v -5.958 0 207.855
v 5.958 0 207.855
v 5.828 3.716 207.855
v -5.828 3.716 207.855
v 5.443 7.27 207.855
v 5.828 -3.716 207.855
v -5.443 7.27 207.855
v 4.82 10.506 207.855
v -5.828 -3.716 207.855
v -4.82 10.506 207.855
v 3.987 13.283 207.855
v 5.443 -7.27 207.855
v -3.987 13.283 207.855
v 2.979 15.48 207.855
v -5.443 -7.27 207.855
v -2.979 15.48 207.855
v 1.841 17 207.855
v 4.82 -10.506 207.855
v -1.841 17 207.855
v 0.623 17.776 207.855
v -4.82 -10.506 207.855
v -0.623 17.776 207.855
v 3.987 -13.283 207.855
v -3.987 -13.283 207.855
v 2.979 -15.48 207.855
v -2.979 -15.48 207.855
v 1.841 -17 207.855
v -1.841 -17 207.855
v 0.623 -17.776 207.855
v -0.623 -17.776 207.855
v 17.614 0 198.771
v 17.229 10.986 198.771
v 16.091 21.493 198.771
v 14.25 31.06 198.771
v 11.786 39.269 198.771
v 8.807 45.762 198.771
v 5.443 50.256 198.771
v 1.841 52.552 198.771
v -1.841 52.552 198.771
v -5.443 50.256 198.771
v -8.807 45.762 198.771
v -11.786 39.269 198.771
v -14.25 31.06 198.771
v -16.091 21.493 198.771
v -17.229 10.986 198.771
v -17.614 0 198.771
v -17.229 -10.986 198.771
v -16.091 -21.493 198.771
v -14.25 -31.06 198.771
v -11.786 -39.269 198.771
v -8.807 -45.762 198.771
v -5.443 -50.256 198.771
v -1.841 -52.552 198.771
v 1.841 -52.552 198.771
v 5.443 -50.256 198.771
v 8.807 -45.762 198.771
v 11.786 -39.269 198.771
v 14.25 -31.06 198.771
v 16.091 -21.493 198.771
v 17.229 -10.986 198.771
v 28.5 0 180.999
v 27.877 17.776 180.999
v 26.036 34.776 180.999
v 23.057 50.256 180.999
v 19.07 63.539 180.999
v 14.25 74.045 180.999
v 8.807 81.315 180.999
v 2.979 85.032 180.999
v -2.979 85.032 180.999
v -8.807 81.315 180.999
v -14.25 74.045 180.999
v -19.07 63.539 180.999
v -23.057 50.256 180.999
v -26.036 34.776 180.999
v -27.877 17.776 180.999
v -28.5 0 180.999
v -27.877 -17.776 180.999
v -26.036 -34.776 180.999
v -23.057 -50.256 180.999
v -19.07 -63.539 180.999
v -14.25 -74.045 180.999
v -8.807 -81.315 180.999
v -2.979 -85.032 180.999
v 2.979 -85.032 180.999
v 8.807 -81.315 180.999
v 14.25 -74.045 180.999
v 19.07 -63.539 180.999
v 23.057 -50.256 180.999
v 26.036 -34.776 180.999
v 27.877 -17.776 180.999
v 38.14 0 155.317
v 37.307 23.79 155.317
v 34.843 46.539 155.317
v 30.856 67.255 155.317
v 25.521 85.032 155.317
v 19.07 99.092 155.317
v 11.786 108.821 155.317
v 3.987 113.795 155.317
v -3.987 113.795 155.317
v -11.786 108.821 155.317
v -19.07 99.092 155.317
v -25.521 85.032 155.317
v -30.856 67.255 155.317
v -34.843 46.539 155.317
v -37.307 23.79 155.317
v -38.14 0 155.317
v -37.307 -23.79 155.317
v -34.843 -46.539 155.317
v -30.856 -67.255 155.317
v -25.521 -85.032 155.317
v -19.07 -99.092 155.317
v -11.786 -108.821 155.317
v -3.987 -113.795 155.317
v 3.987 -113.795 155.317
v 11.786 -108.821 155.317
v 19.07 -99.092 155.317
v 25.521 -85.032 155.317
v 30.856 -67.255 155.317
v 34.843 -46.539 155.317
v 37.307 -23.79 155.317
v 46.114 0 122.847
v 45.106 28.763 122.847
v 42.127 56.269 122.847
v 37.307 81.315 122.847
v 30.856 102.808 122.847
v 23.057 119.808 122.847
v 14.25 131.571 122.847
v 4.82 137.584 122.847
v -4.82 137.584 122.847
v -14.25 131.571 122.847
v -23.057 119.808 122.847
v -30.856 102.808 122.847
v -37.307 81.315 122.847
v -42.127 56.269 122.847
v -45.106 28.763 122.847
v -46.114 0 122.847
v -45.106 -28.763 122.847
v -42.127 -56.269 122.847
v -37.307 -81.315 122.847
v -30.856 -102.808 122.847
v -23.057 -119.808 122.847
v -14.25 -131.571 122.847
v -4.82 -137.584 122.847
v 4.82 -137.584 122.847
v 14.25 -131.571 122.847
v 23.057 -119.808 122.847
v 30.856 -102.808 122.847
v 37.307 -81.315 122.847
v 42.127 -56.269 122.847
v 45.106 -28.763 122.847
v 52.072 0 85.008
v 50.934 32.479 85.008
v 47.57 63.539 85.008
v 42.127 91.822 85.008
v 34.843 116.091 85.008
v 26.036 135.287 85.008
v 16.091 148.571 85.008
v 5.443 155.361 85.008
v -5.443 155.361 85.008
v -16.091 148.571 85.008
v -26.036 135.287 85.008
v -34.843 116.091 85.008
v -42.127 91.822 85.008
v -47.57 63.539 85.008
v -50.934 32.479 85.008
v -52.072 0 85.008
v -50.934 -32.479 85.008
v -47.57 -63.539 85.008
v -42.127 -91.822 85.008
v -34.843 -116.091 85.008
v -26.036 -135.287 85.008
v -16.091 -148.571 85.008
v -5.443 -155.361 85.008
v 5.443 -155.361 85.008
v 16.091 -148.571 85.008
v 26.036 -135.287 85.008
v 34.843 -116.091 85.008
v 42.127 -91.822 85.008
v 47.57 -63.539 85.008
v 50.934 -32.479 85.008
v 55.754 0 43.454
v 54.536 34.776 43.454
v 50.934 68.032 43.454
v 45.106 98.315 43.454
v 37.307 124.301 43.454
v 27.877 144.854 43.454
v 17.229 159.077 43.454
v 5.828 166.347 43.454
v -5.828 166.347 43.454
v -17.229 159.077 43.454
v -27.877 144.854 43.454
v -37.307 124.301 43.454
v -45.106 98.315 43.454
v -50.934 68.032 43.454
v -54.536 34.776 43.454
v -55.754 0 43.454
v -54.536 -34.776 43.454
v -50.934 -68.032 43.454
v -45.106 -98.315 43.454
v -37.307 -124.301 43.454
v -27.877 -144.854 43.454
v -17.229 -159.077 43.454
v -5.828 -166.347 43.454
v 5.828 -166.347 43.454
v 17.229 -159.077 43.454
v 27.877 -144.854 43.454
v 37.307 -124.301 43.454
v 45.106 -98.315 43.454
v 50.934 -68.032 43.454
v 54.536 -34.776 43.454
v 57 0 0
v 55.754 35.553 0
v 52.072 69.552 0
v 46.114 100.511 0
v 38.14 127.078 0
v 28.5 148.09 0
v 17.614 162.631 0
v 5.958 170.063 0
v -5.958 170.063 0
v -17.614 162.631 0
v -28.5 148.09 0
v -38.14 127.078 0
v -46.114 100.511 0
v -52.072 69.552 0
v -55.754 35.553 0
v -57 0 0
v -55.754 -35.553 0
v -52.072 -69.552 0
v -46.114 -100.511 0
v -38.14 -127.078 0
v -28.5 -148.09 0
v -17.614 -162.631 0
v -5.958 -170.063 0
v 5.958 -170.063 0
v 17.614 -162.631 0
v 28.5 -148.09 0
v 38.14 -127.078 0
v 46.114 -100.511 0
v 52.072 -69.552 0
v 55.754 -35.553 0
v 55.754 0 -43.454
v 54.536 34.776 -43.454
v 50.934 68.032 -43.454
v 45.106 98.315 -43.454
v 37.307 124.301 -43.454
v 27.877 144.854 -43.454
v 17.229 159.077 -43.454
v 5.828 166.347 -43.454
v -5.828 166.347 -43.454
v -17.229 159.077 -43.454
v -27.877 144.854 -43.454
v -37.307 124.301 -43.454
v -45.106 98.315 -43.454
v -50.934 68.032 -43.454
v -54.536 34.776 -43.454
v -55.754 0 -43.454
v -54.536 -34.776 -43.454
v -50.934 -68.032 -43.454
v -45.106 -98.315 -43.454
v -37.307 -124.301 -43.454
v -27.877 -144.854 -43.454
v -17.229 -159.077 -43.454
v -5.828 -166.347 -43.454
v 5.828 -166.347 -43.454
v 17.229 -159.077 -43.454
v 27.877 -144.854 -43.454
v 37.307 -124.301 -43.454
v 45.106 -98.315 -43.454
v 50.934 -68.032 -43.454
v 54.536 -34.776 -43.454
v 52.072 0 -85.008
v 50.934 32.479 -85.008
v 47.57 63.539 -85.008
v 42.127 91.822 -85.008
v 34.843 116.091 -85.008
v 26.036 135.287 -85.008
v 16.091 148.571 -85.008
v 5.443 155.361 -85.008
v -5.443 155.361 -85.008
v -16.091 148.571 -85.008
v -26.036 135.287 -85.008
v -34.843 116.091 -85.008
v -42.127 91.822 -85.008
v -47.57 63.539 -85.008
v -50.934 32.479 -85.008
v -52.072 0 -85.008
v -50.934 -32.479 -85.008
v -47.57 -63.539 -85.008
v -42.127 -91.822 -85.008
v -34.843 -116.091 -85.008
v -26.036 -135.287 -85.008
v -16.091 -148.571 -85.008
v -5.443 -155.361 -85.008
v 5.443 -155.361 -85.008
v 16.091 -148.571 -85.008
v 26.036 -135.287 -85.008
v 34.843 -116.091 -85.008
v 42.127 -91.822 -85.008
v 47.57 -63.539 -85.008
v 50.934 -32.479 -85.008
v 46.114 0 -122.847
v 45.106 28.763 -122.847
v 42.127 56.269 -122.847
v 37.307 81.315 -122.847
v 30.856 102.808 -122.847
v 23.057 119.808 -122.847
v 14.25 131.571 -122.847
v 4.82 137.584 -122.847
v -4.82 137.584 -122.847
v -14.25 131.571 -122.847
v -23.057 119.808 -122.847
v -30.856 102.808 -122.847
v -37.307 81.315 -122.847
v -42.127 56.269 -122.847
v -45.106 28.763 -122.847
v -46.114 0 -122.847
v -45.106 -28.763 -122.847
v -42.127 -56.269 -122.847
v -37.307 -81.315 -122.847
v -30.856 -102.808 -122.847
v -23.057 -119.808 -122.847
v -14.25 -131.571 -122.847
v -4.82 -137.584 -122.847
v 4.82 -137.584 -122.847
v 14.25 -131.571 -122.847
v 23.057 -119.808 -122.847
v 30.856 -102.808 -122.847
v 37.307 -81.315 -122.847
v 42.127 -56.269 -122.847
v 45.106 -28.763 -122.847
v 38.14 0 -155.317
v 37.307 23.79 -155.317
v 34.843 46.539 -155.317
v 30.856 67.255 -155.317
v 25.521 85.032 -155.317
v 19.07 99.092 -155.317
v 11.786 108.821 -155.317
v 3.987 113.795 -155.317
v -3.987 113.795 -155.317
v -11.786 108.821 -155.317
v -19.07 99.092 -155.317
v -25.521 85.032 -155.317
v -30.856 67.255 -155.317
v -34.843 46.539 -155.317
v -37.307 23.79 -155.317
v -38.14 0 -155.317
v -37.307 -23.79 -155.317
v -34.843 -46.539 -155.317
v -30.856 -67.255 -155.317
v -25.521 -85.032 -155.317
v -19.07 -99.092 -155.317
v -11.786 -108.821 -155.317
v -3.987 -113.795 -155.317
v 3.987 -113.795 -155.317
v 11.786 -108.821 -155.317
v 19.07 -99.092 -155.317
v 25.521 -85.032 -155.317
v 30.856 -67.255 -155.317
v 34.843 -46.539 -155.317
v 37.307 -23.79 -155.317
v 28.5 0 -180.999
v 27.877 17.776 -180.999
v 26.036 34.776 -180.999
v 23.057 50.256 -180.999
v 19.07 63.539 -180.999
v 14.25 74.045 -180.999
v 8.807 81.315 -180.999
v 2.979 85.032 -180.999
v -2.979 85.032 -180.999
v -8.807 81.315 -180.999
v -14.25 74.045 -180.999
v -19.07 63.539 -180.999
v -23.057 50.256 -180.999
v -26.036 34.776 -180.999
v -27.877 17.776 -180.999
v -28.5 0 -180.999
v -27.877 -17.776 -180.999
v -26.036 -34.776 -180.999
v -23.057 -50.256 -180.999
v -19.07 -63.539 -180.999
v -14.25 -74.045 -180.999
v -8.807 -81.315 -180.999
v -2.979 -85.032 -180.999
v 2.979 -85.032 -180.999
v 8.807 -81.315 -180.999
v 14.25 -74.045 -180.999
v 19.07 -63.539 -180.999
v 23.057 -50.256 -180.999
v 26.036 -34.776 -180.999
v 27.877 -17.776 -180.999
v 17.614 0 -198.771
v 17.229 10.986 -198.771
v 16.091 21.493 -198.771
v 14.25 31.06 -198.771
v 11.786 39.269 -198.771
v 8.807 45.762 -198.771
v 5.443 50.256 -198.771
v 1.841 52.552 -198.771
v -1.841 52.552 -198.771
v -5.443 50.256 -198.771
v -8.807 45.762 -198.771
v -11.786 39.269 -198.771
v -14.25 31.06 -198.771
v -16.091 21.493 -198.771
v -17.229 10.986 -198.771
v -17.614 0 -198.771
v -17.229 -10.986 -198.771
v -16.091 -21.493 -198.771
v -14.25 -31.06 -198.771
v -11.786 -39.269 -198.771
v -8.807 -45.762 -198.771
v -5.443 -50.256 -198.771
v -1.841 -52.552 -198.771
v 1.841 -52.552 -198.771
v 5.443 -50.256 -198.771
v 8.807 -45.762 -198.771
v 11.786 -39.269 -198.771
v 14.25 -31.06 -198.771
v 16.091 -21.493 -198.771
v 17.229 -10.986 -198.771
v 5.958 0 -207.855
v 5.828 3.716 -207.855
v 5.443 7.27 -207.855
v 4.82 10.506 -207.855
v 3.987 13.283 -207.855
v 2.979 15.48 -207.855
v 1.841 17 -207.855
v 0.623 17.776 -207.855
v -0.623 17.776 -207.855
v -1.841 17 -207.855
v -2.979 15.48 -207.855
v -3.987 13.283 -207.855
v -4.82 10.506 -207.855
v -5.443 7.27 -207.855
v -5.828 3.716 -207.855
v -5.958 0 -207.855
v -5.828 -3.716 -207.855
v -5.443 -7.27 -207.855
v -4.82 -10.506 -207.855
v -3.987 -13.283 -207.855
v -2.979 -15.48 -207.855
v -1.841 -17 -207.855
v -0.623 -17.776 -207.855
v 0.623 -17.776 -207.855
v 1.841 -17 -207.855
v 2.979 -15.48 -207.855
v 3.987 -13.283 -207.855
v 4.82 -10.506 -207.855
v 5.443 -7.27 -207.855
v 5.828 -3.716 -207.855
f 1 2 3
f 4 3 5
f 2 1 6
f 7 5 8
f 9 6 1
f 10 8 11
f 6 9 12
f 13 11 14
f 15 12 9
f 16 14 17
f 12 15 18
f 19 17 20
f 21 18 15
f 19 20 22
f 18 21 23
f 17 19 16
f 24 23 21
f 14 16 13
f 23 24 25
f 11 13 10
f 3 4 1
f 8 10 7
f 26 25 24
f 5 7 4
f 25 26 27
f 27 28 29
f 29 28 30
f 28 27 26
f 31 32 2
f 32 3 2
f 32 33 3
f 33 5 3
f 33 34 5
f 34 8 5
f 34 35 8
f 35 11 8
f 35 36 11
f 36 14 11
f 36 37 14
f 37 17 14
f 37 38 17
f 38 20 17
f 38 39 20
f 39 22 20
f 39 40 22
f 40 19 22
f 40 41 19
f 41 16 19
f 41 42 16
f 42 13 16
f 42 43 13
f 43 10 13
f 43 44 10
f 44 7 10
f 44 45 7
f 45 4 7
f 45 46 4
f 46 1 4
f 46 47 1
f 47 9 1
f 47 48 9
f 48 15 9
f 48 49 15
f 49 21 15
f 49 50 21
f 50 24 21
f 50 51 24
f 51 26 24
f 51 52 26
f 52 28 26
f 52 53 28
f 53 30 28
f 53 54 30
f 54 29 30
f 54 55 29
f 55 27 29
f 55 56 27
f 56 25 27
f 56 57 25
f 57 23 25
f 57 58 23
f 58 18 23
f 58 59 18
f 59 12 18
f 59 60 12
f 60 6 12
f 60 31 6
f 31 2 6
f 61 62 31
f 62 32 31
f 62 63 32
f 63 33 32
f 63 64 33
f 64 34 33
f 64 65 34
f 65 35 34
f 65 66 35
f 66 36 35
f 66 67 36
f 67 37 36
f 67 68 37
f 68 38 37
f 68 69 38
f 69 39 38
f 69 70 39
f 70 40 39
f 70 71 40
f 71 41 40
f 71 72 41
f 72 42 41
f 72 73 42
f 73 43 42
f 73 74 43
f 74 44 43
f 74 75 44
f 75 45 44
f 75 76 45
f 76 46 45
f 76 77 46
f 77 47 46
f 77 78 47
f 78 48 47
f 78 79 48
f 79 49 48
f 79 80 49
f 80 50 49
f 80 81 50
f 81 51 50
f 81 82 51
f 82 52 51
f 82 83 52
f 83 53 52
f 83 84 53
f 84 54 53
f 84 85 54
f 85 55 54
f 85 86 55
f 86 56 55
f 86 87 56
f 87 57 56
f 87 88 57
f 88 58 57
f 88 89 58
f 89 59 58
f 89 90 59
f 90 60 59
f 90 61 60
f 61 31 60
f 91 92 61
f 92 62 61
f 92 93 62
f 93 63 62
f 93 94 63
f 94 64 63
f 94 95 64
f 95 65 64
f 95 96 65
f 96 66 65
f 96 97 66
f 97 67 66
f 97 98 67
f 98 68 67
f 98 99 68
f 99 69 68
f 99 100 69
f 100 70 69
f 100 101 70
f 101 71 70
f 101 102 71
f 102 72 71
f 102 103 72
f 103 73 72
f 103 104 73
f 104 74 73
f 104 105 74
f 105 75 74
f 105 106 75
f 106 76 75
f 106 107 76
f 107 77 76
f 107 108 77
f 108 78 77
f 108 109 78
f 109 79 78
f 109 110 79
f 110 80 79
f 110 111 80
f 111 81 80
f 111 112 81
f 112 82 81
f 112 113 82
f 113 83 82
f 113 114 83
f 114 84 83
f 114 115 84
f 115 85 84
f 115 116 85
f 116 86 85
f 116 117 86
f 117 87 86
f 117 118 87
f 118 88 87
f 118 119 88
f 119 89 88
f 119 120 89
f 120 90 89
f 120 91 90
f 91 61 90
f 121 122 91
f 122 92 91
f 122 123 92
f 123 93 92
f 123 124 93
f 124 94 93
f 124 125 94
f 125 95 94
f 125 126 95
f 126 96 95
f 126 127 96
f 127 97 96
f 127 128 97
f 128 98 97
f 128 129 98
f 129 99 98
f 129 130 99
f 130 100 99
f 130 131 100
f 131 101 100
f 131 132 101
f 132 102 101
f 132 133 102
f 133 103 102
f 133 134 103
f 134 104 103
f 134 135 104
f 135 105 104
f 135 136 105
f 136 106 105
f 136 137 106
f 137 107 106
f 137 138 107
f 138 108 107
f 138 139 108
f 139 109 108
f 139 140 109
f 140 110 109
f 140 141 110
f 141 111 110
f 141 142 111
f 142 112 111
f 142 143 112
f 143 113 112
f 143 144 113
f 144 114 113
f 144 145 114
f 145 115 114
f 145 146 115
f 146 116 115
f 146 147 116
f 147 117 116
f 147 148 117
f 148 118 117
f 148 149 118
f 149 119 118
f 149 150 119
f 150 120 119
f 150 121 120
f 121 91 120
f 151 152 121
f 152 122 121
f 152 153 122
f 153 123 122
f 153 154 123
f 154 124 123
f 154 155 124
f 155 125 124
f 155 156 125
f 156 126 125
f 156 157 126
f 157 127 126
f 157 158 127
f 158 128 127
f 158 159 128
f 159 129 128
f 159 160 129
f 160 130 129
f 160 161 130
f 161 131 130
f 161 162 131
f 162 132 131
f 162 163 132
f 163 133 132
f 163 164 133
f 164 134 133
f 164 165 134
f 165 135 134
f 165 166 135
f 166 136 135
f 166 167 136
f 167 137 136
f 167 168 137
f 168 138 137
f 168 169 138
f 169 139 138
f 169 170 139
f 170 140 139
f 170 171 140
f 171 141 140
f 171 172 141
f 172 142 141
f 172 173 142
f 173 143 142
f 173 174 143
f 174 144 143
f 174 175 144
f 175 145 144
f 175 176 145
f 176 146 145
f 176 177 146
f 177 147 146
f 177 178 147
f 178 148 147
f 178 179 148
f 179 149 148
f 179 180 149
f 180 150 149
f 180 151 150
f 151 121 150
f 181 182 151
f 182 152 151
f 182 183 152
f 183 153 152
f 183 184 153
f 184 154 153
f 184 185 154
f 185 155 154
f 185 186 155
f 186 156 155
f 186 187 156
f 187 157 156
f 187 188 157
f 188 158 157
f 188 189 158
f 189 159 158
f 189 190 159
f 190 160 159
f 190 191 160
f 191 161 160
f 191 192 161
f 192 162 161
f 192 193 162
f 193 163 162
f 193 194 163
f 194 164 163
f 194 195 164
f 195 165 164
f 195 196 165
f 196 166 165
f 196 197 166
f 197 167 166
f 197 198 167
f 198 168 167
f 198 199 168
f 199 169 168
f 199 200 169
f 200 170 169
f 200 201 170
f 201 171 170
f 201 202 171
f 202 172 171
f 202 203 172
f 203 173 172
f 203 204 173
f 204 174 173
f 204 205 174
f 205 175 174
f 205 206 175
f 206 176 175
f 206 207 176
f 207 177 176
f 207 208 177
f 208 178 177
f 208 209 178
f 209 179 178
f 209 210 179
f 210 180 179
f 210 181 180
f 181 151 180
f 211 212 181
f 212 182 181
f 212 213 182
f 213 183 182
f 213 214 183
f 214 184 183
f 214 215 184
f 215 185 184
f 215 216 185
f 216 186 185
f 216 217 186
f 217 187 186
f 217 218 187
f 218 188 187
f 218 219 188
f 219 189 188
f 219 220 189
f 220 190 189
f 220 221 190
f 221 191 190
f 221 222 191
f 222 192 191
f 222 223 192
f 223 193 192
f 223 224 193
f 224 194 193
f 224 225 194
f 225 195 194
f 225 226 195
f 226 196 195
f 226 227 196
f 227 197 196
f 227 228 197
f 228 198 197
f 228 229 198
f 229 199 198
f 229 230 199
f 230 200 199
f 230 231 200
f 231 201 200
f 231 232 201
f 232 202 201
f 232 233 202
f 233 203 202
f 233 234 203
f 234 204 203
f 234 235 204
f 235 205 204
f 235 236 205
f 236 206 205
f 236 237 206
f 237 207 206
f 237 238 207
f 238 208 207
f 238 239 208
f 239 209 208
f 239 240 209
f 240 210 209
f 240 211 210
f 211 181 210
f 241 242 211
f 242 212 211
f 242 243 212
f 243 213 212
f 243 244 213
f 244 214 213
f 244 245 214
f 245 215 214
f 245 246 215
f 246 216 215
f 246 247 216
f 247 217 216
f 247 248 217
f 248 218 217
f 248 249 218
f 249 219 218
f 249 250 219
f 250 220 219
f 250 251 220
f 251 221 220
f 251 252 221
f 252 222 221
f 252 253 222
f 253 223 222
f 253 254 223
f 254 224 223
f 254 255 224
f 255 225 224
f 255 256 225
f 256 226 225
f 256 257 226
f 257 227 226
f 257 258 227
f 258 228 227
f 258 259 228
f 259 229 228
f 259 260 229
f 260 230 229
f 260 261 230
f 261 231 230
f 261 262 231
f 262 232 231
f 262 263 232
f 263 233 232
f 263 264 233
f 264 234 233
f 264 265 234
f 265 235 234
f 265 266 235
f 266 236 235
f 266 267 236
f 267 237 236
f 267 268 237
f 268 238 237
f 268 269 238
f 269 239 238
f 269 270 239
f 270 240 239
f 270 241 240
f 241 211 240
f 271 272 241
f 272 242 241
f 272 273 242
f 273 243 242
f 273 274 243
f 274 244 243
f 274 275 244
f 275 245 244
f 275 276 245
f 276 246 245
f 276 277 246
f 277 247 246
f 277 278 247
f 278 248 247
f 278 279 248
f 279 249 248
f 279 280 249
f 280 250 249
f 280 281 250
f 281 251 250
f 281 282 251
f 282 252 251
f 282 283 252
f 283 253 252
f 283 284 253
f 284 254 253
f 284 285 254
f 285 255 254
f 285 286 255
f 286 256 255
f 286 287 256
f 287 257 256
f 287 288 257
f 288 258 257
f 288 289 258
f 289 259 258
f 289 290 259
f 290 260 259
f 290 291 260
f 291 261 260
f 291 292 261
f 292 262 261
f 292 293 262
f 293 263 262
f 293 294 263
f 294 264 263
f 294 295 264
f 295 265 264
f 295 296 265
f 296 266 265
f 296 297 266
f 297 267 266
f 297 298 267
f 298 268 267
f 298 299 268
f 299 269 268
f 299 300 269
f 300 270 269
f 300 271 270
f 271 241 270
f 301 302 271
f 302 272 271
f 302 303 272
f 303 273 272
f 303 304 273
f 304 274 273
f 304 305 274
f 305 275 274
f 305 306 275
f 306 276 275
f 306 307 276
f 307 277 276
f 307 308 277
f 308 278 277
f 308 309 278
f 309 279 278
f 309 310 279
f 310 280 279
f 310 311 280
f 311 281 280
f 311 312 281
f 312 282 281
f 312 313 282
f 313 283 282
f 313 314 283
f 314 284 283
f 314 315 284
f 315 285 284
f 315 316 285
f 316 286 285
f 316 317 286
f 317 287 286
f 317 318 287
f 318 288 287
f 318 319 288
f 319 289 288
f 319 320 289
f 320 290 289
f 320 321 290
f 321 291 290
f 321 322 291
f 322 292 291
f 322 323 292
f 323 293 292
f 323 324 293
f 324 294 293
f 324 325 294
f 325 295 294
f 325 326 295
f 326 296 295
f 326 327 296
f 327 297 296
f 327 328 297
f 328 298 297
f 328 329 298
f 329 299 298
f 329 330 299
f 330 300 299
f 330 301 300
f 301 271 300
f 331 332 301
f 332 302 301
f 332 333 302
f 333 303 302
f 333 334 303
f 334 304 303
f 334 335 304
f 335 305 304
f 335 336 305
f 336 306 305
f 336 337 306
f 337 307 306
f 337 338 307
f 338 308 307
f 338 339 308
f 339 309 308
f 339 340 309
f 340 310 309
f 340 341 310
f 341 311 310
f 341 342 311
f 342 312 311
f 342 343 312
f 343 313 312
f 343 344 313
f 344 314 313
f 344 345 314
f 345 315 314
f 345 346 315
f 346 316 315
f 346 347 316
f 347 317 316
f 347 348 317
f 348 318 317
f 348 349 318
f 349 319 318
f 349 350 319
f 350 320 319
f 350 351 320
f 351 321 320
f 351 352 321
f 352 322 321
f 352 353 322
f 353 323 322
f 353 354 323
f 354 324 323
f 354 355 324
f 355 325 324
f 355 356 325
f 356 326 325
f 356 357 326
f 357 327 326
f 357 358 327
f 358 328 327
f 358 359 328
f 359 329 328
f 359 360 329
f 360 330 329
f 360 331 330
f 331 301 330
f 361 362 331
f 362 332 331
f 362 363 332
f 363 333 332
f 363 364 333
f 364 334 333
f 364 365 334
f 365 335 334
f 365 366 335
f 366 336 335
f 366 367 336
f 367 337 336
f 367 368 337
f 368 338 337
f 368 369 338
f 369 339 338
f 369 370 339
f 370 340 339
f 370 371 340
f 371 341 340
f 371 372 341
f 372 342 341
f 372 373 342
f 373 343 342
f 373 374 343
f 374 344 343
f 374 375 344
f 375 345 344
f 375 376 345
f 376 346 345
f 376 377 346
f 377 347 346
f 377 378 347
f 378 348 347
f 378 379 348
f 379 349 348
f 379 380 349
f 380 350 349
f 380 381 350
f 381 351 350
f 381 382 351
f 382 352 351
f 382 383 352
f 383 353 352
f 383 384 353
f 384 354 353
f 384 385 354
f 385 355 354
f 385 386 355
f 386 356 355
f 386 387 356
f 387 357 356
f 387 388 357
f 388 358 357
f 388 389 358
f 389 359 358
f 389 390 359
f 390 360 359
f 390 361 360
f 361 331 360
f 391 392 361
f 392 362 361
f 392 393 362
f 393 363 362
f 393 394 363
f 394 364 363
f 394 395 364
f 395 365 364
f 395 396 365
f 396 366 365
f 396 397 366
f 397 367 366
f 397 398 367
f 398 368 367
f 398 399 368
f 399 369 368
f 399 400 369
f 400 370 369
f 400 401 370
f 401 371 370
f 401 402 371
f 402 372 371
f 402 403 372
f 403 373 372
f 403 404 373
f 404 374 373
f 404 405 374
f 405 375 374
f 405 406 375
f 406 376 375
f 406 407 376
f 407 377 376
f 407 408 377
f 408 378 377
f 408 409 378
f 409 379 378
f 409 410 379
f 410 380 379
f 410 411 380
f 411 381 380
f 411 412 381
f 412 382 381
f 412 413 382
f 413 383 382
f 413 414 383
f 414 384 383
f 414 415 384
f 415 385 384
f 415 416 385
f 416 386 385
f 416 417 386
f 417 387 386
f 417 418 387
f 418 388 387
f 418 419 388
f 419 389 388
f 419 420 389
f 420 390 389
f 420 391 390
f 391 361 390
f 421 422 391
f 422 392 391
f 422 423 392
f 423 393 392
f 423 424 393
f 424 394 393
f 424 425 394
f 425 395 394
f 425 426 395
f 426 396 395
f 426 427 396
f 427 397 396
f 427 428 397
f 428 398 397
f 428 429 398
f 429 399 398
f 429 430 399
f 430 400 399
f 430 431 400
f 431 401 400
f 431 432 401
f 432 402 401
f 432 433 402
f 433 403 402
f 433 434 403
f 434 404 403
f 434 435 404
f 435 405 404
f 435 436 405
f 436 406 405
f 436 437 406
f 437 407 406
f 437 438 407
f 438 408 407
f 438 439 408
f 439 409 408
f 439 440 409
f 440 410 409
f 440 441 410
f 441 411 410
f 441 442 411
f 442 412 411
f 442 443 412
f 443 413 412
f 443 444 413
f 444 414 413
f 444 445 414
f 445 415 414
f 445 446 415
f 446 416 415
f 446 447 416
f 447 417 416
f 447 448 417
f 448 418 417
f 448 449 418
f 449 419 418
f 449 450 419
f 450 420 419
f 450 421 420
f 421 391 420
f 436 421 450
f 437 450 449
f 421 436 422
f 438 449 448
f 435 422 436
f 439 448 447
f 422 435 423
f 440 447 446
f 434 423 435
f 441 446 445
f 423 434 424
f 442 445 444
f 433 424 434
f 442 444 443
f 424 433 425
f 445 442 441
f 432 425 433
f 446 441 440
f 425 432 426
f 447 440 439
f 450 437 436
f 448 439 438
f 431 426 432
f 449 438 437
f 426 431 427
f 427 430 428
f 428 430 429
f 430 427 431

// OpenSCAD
// Generated by SolidPython 1.0.1 on 2020-07-29 00:46:45


scale(v = [3, 9, 11]) {
	sphere(r = 19);
}
/***********************************************
*********      SolidPython code:      **********
************************************************
 
# import packages: SolidPython
from solid import *
from solid.utils import *
from itertools import chain, combinations, permutations


class Resize:

    def __init__(self, scad_file):
        self.scad_file = scad_file
        #self.scad_file = import_scad(scad_file)
        # cone/cylinder param:
        self.r1 = 0
        self.r2 = 0
        self.h = 0
        # rectangular prism param:
        self.w = 0
        self.l = 0
        # ellipse param:
        self.r = 0

    # import OpenScad code (file name corresponds to shape)


    # classify shape + parameters
    def assign(self, param1, param2, param3):
        if self.scad_file == 'cone.scad':
            self.r1 = param1
            self.r2 = param2
            self.h = param3
        elif self.scad_file == 'cylinder.scad':
            self.r1 = param1
            self.r2 = param2
            self.h = param3
        elif self.scad_file == 'rectangularPrism.scad':
            self.h = param1
            self.l = param2
            self.w = param3
        else:
            self.r = param1
            self.h = param2

    # resize parameters
    def iterate(self):
        x = range(3, 20, 2)
        i = 1
        if self.scad_file == 'cone.scad':
            tempList = list(permutations(x, 2))
            for temp in tempList:
                param1 = temp[0]
                param2 = temp[1]
                filepath = 'produced_scad_files/' + 'cone' + str(param1) + '_' + str(param2) + '_' + '.scad'
                scad_render_to_file(cylinder(h=param1, r1=param2, r2=0), filepath)

        elif self.scad_file == 'cylinder.scad':
            tempList = list(permutations(x, 3))
            for temp in tempList:
                param1 = temp[0]
                param2 = temp[1]
                filepath = 'produced_scad_files/' + 'cylinder' + str(param1) + '_' + str(param2) + '_' + '.scad'
                scad_render_to_file(cylinder(h=param1, r1=param2, r2=param2), filepath)

        elif self.scad_file == 'rectangularPrism.scad':
            tempList = list(permutations(x, 3))
            for temp in tempList:
                param1 = temp[0]
                param2 = temp[1]
                param3 = temp[2]
                filepath = 'produced_scad_files/' + 'rectangularPrism' + str(param1) + '_' + str(param2) + '_' + str(
                    param3) + '.scad'
                scad_render_to_file(cube(size=(param1, param2, param3)), filepath)

        elif self.scad_file == 'ellipse.scad':
            tempList = list(permutations(x, 4))
            for temp in tempList:
                param1 = temp[0]
                param2 = temp[1]
                param3 = temp[2]
                param4 = temp[3]
                filepath = 'produced_scad_files/' + 'ellipse' + str(param1) + '_' + str(param2) + '_' + str(param3) + '_' + str(param4) + '.scad'
                scad_render_to_file(scale([param1, param2, param3])(sphere(r=param4)), filepath)

    def render_to_scadfile(self):
        scad_render_to_file(scad, 'example.scad') 
 
************************************************/
